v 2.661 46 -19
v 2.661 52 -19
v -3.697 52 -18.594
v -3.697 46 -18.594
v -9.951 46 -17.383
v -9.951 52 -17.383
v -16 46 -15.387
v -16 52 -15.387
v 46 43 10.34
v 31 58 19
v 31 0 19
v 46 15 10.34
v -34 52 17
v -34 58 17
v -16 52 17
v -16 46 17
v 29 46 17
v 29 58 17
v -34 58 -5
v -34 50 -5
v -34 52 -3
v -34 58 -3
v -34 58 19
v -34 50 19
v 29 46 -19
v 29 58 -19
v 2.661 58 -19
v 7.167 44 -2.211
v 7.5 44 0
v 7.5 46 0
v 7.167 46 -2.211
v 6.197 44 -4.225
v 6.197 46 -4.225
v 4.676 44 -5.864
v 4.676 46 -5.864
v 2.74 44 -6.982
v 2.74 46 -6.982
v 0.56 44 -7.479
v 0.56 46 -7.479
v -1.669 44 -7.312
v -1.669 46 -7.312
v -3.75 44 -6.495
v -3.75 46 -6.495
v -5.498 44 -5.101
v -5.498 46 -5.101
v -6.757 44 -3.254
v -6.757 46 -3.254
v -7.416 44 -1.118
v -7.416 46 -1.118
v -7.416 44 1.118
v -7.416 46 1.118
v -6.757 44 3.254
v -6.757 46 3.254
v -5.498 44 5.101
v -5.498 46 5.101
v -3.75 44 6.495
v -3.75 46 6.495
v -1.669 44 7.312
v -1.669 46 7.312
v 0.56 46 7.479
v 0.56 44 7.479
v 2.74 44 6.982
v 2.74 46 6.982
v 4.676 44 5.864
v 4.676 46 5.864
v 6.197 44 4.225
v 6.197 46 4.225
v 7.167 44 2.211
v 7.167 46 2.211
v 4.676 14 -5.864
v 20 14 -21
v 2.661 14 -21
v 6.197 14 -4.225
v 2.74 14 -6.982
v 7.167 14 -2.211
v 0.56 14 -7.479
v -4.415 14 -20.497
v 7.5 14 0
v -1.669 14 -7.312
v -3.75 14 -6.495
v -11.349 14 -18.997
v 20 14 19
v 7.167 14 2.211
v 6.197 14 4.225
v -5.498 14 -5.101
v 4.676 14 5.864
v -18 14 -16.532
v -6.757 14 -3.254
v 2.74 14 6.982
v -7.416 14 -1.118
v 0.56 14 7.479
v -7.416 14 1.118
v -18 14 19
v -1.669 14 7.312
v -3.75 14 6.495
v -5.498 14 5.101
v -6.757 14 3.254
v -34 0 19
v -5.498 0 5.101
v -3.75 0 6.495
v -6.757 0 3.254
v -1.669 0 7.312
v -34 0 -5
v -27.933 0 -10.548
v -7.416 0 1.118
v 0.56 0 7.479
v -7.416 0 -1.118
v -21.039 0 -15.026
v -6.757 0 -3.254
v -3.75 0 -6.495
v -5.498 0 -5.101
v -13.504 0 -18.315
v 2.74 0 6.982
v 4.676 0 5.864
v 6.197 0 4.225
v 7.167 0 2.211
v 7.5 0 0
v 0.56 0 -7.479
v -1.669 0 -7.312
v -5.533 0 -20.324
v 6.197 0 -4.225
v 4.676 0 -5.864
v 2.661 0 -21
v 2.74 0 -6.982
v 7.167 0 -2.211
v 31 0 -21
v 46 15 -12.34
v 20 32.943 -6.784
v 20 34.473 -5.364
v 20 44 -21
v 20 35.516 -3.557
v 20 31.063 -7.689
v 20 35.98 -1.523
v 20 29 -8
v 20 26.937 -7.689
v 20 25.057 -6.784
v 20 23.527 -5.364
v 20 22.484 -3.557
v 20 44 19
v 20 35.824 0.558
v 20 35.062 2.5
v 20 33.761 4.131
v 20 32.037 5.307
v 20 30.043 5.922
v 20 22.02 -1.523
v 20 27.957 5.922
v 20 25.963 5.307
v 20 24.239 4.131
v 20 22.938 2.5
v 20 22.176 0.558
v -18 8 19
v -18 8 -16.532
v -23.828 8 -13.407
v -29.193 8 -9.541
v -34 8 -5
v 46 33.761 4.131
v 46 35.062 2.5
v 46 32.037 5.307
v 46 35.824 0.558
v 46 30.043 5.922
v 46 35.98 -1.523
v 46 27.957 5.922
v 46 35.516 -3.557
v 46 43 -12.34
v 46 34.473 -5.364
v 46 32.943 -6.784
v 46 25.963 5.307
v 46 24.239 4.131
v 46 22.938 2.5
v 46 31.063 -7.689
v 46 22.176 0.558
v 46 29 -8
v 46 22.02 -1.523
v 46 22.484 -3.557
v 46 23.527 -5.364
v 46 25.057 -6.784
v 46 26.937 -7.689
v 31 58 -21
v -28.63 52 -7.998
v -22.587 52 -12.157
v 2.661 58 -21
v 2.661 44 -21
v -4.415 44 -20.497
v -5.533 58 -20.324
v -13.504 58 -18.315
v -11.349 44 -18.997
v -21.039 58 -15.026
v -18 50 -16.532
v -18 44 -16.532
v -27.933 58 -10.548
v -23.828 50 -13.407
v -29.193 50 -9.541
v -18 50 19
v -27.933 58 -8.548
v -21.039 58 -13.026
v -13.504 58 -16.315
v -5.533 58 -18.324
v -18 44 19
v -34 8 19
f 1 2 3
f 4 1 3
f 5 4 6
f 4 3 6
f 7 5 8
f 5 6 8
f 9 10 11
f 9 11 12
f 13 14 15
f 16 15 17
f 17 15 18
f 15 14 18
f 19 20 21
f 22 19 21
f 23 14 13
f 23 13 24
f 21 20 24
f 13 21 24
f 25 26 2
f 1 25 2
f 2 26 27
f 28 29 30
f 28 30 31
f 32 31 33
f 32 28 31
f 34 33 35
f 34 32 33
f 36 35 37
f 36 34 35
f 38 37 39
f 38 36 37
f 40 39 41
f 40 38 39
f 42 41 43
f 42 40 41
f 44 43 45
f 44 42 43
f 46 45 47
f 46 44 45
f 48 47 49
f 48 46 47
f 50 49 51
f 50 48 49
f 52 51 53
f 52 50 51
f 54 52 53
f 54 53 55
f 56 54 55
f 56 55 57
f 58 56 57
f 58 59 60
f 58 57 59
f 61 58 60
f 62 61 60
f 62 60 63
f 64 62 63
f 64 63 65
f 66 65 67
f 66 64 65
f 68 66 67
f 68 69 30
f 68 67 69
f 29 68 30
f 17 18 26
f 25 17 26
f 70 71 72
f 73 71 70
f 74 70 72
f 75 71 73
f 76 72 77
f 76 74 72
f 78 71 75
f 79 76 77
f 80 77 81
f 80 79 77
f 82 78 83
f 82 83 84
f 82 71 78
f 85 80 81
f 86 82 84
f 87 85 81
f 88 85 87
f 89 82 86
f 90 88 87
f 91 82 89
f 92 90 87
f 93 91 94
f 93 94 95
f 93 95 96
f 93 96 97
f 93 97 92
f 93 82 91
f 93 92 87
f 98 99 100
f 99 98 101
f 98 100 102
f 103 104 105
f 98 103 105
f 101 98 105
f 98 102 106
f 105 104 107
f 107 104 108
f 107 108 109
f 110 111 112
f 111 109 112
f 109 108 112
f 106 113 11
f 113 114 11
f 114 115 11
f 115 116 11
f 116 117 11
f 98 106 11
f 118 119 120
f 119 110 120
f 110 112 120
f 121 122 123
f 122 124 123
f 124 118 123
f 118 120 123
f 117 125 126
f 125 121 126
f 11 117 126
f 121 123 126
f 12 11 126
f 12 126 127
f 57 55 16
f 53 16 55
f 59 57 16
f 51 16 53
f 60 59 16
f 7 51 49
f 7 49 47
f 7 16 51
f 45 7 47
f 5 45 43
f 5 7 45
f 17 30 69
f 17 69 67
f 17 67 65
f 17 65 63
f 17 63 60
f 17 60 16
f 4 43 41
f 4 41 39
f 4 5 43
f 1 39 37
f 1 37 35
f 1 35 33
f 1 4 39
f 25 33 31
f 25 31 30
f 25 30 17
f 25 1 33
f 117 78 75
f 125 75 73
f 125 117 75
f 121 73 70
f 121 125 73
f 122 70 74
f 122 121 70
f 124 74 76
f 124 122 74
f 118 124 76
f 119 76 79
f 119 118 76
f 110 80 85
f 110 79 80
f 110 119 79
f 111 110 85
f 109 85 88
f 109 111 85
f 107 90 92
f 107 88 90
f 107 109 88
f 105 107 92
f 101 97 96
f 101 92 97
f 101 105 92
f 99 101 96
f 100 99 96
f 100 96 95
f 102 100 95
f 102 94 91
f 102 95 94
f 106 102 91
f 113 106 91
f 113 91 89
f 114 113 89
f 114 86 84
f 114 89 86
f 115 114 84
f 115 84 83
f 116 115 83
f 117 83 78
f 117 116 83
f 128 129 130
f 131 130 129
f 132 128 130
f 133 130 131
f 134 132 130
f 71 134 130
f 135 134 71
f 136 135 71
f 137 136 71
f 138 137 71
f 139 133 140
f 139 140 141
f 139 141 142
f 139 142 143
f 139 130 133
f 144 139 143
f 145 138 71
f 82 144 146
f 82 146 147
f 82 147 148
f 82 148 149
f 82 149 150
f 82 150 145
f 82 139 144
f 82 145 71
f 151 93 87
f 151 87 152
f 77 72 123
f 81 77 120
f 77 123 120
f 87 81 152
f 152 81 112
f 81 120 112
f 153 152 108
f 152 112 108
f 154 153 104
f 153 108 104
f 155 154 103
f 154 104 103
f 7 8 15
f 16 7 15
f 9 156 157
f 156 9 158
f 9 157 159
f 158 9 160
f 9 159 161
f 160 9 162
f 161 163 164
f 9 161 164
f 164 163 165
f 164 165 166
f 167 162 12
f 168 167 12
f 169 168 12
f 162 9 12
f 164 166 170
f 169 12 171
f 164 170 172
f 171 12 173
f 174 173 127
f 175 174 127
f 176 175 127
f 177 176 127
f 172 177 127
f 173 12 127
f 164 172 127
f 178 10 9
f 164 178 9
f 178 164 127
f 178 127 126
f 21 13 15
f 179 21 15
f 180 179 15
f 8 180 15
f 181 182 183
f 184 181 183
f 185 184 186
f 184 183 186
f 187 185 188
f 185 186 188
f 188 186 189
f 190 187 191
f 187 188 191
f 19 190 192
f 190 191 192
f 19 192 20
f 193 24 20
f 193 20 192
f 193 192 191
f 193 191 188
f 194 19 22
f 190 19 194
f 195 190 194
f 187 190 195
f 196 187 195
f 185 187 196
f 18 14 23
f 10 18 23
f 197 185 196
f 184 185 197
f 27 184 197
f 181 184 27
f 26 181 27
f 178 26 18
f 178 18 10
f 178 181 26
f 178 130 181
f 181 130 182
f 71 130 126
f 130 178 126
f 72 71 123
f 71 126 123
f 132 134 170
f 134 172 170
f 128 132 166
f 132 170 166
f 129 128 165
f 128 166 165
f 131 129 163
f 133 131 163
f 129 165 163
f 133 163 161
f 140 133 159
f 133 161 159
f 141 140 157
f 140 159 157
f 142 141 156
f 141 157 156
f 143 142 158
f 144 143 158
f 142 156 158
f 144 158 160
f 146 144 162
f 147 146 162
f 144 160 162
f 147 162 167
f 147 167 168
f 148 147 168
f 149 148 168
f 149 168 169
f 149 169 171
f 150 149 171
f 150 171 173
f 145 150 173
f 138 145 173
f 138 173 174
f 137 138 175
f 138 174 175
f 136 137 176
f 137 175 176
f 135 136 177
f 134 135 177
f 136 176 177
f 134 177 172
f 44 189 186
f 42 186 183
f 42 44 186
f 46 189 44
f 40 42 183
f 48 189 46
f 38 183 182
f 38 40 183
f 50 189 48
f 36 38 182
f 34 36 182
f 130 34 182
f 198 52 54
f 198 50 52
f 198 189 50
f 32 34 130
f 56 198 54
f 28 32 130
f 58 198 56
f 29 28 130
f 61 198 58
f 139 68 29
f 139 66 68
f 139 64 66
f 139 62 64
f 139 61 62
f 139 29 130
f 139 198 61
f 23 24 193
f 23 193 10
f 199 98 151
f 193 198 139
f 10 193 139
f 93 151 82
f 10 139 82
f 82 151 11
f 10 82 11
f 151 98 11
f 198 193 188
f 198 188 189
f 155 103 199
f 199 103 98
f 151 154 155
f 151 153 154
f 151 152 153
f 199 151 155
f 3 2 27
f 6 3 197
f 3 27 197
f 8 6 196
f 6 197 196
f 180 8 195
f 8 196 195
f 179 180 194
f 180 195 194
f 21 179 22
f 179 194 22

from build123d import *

# Parameters (mm, degrees)
SKETCH1_R           = 7.5
BOSS_EXTRUDE2_DEPTH = 58
CUT_EXTRUDE1_DEPTH  = 29
SKETCH6_R           = 7
CUT_EXTRUDE2_DEPTH  = 64
CUT_EXTRUDE3_DEPTH  = 64
CUT_EXTRUDE7_DEPTH  = 6
CUT_EXTRUDE8_DEPTH  = 6


with BuildPart() as part:
    # Sketch1 → Boss-Extrude2 (new body)
    with BuildSketch(Plane(origin=(0, 0, 0), x_dir=(1, 0, 0), z_dir=(0, 1, 0))):
        with BuildLine():
            Line((0, -19), (31, -19))
            Line((31, -19), (46, -10.339745962))
            Line((46, -10.339745962), (46, 12.339745962))
            Line((46, 12.339745962), (31, 21))
            Line((31, 21), (2.66060556, 21))
            ThreePointArc((2.66060556, 21), (-17.33939444, 16.82575695), (-34, 5))
            Line((-34, 5), (-34, -19))
            Line((-34, -19), (0, -19))
        make_face()
        Circle(SKETCH1_R, mode=Mode.SUBTRACT)
    extrude(amount=BOSS_EXTRUDE2_DEPTH)

    # Sketch4 → Cut-Extrude1 (cut, symmetric)
    with BuildSketch(Plane.XY):
        Polygon((31, 0), (46, 15), (46, 0), align=None)
        Polygon((31, 58), (46, 43), (46, 58), align=None)
    extrude(amount=CUT_EXTRUDE1_DEPTH, both=True, mode=Mode.SUBTRACT)

    # Sketch6 → Cut-Extrude2 (cut, symmetric)
    with BuildSketch(Plane(origin=(0, 0, 0), x_dir=(0, 0, -1), z_dir=(1, 0, 0))):
        with Locations((1, 29)):
            Circle(SKETCH6_R)
    extrude(amount=CUT_EXTRUDE2_DEPTH, both=True, mode=Mode.SUBTRACT)

    # Sketch7 → Cut-Extrude3 (cut, symmetric)
    with BuildSketch(Plane.XY.offset(19)):
        Polygon((-34, 50), (-18, 50), (-18, 44), (20, 44), (20, 14), (-18, 14), (-18, 8), (-34, 8), align=None)
    extrude(amount=CUT_EXTRUDE3_DEPTH, both=True, mode=Mode.SUBTRACT)

    # Sketch8 → Cut-Extrude7 (cut)
    with BuildSketch(Plane(origin=(0, 58, 0), x_dir=(1, 0, 0), z_dir=(0, 1, 0))):
        with BuildLine():
            Line((29, 19), (2.66060556, 19))
            ThreePointArc((2.66060556, 19), (-17.33939444, 14.82575695), (-34, 3))
            Line((-34, 3), (-34, -17))
            Line((-34, -17), (29, -17))
            Line((29, -17), (29, 19))
        make_face()
    extrude(amount=-CUT_EXTRUDE7_DEPTH, mode=Mode.SUBTRACT)

    # Sketch11 → Cut-Extrude8 (cut)
    with BuildSketch(Plane(origin=(0, 52, 0), x_dir=(1, 0, 0), z_dir=(0, 1, 0))):
        with BuildLine():
            Line((-16, -17), (29, -17))
            Line((29, -17), (29, 19))
            Line((29, 19), (2.66060556, 19))
            ThreePointArc((2.66060556, 19), (-6.842943589, 18.088517533), (-16, 15.387302143))
            Line((-16, 15.387302143), (-16, -17))
        make_face()
    extrude(amount=-CUT_EXTRUDE8_DEPTH, mode=Mode.SUBTRACT)


solid = part.part
